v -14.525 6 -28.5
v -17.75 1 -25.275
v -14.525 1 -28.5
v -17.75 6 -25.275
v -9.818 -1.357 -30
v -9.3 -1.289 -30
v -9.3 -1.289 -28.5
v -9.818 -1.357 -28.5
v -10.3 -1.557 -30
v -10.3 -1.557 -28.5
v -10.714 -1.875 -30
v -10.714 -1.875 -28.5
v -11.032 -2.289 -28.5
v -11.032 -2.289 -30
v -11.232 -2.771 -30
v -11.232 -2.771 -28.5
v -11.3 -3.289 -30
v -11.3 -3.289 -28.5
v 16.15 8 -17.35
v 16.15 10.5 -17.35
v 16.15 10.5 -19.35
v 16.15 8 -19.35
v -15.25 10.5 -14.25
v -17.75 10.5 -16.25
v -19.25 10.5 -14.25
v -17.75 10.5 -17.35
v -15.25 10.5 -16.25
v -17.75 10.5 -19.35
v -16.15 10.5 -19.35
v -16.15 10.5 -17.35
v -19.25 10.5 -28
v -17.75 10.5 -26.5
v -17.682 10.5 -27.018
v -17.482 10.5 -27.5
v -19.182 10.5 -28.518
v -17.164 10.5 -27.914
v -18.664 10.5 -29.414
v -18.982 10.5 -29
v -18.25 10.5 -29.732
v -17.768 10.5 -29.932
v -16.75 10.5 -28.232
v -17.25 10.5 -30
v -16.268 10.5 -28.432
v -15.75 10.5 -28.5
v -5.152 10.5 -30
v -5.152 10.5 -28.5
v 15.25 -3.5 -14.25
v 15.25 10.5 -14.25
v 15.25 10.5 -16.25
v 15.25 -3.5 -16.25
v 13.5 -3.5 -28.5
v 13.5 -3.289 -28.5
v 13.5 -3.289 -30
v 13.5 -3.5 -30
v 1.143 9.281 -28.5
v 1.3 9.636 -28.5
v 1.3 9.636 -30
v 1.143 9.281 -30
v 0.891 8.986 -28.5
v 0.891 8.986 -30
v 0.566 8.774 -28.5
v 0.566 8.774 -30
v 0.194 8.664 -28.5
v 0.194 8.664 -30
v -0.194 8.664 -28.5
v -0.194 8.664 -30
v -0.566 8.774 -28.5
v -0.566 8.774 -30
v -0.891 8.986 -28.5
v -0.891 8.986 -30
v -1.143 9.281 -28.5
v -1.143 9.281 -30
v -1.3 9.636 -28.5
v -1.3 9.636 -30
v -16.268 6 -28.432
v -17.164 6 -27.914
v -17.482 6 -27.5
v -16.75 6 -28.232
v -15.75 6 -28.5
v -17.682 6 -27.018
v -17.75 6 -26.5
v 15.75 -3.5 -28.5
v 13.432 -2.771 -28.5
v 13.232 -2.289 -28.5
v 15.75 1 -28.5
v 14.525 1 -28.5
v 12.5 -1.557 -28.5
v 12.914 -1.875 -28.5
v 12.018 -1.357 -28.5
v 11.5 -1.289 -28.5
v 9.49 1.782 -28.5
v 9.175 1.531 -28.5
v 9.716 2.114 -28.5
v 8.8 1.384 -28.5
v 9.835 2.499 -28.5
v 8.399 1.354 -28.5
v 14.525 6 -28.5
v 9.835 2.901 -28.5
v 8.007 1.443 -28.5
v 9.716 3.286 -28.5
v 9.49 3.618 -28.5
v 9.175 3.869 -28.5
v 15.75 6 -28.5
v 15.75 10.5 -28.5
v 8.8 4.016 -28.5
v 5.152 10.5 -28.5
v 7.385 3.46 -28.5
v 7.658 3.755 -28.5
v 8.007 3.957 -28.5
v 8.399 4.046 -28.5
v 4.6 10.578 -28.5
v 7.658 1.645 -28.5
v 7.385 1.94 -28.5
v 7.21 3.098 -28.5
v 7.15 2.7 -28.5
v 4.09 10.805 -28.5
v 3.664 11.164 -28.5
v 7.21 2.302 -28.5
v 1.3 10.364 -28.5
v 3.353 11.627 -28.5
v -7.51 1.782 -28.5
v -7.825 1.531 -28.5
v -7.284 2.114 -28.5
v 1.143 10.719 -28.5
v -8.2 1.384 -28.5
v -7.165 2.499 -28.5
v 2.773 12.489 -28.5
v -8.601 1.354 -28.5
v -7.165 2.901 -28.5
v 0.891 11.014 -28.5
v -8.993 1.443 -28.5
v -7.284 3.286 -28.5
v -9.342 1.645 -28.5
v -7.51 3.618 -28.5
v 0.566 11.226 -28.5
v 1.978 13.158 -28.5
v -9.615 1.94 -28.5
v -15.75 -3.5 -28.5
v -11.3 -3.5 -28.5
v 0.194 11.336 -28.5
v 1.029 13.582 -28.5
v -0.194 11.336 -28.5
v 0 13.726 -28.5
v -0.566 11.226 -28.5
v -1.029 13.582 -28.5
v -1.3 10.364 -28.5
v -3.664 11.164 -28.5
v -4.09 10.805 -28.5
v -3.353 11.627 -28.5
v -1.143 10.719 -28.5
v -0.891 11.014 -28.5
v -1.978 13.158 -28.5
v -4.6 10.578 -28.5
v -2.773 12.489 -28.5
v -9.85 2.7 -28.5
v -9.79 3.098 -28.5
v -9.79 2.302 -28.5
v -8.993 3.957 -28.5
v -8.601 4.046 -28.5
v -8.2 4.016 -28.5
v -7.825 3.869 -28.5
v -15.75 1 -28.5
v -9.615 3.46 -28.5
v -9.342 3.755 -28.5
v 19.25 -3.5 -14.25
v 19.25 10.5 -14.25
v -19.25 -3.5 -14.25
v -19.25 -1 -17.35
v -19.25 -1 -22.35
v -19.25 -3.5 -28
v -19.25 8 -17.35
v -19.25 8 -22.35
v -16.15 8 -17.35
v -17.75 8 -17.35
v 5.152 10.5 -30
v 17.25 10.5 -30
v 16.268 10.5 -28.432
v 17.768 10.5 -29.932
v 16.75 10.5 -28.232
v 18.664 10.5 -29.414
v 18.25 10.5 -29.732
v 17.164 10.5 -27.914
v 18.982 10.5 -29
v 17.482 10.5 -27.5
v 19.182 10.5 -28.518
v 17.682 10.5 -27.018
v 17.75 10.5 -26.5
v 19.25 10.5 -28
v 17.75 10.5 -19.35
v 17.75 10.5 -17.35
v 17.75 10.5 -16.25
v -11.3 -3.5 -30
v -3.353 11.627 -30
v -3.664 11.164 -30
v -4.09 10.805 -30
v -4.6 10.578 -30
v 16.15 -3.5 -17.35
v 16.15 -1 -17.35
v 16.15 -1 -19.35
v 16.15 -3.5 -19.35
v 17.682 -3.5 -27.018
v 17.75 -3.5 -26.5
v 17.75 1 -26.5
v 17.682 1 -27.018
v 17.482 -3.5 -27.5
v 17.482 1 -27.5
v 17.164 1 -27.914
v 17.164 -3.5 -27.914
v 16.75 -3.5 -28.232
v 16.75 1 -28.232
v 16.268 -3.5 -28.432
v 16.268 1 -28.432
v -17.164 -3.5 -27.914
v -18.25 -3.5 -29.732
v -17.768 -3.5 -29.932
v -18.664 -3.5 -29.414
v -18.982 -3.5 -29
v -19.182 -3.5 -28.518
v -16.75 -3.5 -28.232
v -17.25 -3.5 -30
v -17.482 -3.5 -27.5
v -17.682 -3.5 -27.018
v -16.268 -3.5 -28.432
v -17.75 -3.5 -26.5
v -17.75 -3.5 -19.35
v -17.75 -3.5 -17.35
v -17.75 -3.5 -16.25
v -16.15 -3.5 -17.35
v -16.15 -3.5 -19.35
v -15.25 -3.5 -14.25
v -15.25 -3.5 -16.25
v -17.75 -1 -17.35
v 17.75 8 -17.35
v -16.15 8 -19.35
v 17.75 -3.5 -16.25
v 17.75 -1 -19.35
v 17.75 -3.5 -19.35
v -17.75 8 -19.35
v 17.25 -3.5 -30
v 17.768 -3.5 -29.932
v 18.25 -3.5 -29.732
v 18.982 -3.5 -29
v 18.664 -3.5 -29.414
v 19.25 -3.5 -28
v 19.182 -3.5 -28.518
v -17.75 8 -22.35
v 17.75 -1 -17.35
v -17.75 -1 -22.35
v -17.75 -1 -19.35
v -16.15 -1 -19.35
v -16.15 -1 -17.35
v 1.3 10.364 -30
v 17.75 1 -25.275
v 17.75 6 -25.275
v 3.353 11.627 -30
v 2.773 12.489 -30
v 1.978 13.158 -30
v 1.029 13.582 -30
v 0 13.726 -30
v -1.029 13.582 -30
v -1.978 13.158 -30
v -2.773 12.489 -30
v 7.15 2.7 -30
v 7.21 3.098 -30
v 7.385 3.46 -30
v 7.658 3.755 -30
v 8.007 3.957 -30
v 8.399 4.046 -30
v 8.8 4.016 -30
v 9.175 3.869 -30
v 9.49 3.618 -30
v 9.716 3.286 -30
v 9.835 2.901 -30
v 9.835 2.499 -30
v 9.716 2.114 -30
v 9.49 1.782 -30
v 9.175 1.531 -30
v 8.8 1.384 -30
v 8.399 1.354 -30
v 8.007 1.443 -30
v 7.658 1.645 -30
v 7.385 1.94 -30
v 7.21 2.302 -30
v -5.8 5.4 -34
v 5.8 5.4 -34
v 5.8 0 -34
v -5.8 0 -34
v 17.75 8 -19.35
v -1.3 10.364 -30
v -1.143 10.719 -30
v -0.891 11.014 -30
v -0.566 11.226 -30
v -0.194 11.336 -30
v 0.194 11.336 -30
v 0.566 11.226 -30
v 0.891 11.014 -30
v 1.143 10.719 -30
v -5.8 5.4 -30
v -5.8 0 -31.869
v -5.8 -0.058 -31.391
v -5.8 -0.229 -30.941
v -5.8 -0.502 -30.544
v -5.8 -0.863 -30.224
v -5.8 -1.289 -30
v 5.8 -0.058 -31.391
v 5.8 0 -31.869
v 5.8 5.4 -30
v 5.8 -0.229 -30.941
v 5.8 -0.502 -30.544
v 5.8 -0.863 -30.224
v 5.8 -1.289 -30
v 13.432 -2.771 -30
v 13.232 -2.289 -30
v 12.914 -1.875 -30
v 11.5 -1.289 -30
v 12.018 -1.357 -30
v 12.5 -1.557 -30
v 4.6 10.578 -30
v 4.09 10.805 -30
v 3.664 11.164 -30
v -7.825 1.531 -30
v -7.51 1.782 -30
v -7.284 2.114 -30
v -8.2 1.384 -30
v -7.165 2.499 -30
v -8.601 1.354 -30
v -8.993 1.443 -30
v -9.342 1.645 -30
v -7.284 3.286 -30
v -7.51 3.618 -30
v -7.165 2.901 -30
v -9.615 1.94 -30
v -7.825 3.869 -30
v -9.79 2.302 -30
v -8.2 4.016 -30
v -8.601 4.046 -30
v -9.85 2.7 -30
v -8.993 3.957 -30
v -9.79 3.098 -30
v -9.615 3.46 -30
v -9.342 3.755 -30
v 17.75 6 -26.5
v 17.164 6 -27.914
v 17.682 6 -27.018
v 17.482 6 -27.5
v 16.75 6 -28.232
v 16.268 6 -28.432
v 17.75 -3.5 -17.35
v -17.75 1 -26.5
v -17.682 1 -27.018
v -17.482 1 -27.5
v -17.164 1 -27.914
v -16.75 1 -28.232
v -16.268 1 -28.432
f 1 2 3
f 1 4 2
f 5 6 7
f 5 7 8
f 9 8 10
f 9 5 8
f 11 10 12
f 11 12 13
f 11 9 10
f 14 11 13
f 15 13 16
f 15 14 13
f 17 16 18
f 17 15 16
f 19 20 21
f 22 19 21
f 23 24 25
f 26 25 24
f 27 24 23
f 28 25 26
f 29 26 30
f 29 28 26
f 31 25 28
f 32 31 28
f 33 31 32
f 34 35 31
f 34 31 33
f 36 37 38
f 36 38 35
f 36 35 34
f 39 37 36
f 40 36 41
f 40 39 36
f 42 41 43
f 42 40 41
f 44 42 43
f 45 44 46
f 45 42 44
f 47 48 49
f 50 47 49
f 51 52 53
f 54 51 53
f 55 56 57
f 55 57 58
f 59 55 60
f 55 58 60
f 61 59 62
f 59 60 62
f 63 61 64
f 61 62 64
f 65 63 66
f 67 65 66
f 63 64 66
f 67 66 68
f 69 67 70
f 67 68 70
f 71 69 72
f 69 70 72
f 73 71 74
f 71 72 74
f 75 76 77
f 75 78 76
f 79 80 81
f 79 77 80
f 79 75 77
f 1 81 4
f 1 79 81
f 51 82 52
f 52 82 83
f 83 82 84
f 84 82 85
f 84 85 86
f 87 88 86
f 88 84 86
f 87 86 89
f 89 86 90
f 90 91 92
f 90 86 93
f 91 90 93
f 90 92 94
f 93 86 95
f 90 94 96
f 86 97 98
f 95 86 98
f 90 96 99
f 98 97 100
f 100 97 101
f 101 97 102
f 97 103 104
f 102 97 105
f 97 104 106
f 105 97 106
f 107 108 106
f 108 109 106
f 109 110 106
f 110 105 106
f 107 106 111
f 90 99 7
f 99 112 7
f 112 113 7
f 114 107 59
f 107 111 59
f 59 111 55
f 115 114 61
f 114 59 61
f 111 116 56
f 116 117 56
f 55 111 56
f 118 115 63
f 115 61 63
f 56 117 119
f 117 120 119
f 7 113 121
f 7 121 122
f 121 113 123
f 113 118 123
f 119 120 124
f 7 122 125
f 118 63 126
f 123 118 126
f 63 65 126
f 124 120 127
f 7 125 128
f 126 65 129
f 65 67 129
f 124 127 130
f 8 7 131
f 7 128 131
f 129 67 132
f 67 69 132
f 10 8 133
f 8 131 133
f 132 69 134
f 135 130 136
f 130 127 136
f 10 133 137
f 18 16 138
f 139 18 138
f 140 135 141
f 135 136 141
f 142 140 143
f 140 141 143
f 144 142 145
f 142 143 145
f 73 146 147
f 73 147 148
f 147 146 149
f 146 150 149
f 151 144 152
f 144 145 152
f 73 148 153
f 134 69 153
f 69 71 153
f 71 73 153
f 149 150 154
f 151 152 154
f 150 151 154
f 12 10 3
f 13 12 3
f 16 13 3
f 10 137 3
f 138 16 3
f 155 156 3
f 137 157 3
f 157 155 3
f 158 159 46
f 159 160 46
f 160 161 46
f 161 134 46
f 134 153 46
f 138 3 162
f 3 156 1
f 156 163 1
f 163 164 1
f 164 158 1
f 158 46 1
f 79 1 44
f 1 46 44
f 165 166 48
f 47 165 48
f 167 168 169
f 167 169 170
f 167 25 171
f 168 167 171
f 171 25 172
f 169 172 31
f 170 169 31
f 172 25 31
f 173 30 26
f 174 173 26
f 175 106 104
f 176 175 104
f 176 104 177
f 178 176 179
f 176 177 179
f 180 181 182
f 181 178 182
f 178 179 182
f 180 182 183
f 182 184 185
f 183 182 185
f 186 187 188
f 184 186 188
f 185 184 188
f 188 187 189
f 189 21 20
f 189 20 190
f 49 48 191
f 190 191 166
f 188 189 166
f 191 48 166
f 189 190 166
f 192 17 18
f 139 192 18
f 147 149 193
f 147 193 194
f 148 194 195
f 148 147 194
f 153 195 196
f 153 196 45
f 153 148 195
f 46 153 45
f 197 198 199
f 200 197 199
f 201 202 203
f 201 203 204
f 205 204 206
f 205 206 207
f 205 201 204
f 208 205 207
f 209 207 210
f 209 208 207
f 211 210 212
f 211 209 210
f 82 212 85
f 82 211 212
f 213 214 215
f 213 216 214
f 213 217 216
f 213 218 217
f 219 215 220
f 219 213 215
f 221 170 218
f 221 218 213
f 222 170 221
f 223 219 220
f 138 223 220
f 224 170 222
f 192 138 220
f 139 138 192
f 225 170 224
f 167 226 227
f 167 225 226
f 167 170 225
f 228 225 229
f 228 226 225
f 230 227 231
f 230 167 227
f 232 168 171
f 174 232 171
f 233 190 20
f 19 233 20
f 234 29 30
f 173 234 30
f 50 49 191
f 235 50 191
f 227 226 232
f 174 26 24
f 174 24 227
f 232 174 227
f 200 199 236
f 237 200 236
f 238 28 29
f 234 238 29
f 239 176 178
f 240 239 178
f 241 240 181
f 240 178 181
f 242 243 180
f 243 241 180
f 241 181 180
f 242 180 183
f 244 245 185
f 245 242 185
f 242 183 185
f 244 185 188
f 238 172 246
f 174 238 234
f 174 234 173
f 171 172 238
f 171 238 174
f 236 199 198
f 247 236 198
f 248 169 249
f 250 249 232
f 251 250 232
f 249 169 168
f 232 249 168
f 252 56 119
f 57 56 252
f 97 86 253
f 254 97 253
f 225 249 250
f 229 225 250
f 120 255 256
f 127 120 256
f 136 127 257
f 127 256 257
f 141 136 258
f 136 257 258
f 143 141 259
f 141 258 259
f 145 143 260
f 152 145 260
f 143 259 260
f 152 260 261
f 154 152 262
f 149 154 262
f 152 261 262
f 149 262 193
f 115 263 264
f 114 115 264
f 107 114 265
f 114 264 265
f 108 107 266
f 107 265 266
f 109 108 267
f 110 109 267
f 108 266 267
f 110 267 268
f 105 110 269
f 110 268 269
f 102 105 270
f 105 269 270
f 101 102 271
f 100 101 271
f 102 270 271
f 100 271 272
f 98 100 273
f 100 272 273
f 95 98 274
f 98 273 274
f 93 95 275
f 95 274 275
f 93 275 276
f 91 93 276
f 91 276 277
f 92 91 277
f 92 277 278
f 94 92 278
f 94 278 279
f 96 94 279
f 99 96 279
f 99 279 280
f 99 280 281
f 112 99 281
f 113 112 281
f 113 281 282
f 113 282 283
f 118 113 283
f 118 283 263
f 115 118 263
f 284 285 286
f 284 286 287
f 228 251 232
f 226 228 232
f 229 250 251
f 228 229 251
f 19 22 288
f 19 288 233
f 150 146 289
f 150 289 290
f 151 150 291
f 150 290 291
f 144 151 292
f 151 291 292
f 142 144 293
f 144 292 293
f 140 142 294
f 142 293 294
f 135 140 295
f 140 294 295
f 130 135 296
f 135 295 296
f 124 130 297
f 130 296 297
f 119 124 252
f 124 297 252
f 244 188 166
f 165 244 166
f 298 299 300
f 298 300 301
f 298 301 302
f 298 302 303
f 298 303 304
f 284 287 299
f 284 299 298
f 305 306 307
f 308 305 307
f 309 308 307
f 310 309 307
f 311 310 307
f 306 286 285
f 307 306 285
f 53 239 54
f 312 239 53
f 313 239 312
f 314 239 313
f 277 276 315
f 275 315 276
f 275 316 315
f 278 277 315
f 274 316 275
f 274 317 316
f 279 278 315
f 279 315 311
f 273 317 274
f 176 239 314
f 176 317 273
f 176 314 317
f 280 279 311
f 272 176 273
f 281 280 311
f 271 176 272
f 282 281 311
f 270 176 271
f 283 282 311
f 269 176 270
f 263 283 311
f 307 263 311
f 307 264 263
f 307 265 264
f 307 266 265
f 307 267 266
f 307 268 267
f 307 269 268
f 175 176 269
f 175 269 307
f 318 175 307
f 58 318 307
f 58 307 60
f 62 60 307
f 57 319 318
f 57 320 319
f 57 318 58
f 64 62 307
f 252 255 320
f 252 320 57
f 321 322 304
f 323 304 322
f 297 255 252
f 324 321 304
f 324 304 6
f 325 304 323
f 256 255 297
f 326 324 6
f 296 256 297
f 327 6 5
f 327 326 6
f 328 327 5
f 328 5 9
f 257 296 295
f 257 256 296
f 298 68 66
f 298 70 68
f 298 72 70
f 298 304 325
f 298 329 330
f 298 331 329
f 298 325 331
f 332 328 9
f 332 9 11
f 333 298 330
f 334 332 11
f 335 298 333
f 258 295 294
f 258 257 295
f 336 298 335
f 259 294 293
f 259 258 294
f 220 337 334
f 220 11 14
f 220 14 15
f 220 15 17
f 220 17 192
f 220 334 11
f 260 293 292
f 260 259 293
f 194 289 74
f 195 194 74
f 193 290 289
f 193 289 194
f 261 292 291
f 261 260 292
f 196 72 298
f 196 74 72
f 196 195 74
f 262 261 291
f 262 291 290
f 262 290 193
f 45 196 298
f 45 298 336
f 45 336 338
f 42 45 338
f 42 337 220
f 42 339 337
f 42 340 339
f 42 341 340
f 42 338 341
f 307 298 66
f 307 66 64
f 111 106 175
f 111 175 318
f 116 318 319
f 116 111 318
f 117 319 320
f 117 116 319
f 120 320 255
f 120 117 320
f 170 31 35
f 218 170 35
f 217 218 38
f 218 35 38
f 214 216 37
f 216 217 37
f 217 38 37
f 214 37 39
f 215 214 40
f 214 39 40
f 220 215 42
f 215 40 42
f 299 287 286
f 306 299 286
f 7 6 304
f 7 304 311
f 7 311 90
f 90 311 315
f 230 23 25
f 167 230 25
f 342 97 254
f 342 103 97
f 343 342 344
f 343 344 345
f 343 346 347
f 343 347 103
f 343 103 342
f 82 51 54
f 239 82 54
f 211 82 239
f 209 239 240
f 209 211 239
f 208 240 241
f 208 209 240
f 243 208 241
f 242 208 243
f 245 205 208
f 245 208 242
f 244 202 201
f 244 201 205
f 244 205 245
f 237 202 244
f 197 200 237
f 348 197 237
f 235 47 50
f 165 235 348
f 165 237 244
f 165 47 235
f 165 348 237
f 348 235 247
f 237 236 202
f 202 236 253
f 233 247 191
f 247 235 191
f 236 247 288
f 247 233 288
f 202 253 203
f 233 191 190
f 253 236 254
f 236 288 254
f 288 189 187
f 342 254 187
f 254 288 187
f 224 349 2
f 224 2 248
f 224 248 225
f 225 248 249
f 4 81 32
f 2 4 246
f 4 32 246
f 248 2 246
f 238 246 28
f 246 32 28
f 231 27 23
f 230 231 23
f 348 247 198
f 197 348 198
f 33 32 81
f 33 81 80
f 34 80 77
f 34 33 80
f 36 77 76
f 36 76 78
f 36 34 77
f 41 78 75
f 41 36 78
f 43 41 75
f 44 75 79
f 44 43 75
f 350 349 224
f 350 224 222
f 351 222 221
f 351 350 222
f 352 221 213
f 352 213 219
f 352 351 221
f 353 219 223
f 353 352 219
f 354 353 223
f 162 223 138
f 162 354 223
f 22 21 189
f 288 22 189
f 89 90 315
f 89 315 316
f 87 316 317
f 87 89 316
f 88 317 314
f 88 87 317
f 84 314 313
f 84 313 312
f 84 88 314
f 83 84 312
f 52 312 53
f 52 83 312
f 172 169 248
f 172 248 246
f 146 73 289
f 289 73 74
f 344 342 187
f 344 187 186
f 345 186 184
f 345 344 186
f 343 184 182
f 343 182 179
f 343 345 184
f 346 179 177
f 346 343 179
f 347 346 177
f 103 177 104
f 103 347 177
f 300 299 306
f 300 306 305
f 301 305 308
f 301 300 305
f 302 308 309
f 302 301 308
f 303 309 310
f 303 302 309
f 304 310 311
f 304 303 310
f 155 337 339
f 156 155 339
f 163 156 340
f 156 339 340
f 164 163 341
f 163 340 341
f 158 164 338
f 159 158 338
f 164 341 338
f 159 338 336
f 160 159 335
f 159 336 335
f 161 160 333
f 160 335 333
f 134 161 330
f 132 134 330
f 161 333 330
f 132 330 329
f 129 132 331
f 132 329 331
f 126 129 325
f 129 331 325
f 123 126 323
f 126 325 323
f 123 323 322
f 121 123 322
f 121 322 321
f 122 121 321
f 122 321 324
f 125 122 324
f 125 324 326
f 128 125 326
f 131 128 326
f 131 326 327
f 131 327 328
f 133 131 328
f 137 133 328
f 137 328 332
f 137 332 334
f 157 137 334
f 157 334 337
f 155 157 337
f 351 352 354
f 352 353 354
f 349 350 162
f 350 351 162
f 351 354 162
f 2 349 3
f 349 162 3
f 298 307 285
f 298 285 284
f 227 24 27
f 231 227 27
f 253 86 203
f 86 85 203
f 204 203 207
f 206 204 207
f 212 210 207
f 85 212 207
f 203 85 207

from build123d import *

# Parameters (mm, degrees)
SKETCH_1_W               = 27
SKETCH_1_H               = 17
EXTRUDE_1_DEPTH          = 1
SKETCH_2_R               = 2.55
CUT_EXTRUDE_1_DEPTH      = 16.984367363
EXTRUDE_2_DEPTH          = 17
SKETCH_6_W               = 1.5
SKETCH_6_H               = 2
EXTRUDE_3_DEPTH          = 2
CHAMFER_1_SIZE           = 1
CUT_EXTRUDE_4_REACH      = 39.316
SKETCH_8_R               = 2
FILLET_1_R               = 3
SKETCH_9_W               = 7
SKETCH_9_H               = 13
EXTRUDE_4_DEPTH          = 1.5
SKETCH_7_R               = 1.35
CUT_EXTRUDE_5_DEPTH      = 10
CUT_EXTRUDE_6_REACH      = 41.373
FILLET_2_R               = 2.2
SKETCH_13_W              = 11.6
SKETCH_13_H              = 5.4
EXTRUDE_6_DEPTH          = 4
CUT_EXTRUDE_7_DEPTH      = 44.188540186
CUT_EXTRUDE_7_DEPTH_BACK = 44.188540186
SKETCH_14_OUTSIDE_W      = 46.664
SKETCH_14_OUTSIDE_H      = 47.664
SKETCH_14_OUTSIDE_W_2    = 27
SKETCH_14_OUTSIDE_H_2    = 5.5
EXTRUDE_7_DEPTH          = 3.5
EXTRUDE_7_DEPTH_BACK     = 10.5
SKETCH_16_W              = 5.6
SKETCH_16_H              = 1.5
SKETCH_16_W_2            = 4.4
SKETCH_16_W_3            = 12.2
EXTRUDE_8_DEPTH          = 2
EXTRUDE_9_DEPTH          = 2.5
CUT_EXTRUDE_8_REACH      = 54.983
SKETCH_18_W              = 5
SKETCH_18_H              = 9
EXTRUDE_START            = -1.5
SKETCH_19_R              = 3.726433752
SKETCH_19_R_2            = 1.35
SKETCH_19_W              = 24.8
SKETCH_19_H              = 1.288897449
EXTRUDE_10_DEPTH         = 1.5
FILLET_4_R               = 2


# Some blends are built 0.0001 mm under size
with BuildPart() as part:
    # 草图1 → 凸台-拉伸1 (new body)
    with BuildSketch(Plane.XY):
        Rectangle(SKETCH_1_W, SKETCH_1_H)
    extrude(amount=EXTRUDE_1_DEPTH)

    # 草图2 → 切除-拉伸1 (cut, through all)
    with BuildSketch(Plane.XY.offset(1)):
        with Locations((0, 4.125)):
            Circle(SKETCH_2_R)
        with Locations((0, -4.125)):
            Circle(SKETCH_2_R)
        with Locations((8.27, 4.125)):
            Circle(SKETCH_2_R)
        with Locations((8.27, -4.125)):
            Circle(SKETCH_2_R)
        with Locations((-8.27, 4.125)):
            Circle(SKETCH_2_R)
        with Locations((-8.27, -4.125)):
            Circle(SKETCH_2_R)
    extrude(amount=-CUT_EXTRUDE_1_DEPTH, mode=Mode.SUBTRACT)

    # 草图3 → 凸台-拉伸2 (add)
    with BuildSketch(Plane.XZ.offset(8.5)):
        Polygon((13.5, 0), (19, 0), (19, -28.5), (-13.5, -28.5), (-13.5, -30), (20.5, -30), (20.5, 1), (13.5, 1), align=None)
    extrude(amount=-EXTRUDE_2_DEPTH)

    # 草图6 → 凸台-拉伸3 (add, symmetric)
    with BuildSketch(Plane(origin=(0, 0, 0), x_dir=(1, 0, 0), z_dir=(0, 1, 0))):
        Polygon((19, 0), (19, 5), (14, 0), align=None)
        Polygon((19, 28.5), (14, 28.5), (19, 23.5), align=None)
        with Locations((18.25, 20)):
            Rectangle(SKETCH_6_W, SKETCH_6_H)
    extrude(amount=EXTRUDE_3_DEPTH, both=True)

    # 倒角1
    chamfer_1_edges = [part.edges().sort_by_distance(p)[0] for p in [
        (-13.5, 0, 0),
    ]]
    chamfer(chamfer_1_edges, length=CHAMFER_1_SIZE - 0.0001)  # a hair under: the kernel refuses the full size

    # 草图8 → 切除-拉伸4 (cut, up to next)
    with BuildSketch(Plane(origin=(0, 0, 0), x_dir=(-1, 0, 0), z_dir=(0, 0, -1)), mode=Mode.PRIVATE) as cut_extrude_4_sk1:
        Circle(SKETCH_8_R)
    cut_extrude_4_tool1 = extrude(cut_extrude_4_sk1.sketch, amount=-CUT_EXTRUDE_4_REACH, mode=Mode.PRIVATE) & part.part
    add(cut_extrude_4_tool1.solids().sort_by_distance((0, 0, 0))[0], mode=Mode.SUBTRACT)

    # 圆角1
    fillet_1_edges = [part.edges().sort_by_distance(p)[0] for p in [
        (20.5, 0, 1),
        (20.5, 0, -30),
        (19, 5.25, -28.5),
        (19, 5.25, 0),
        (19, -5.25, 0),
        (19, -5.25, -28.5),
    ]]
    fillet(fillet_1_edges, radius=FILLET_1_R)

    # 草图9 → 凸台-拉伸4 (add)
    with BuildSketch(Plane(origin=(0, 0, -30), x_dir=(-1, 0, 0), z_dir=(0, 0, -1))):
        with Locations((0, 6.5)):
            Rectangle(SKETCH_9_W, SKETCH_9_H)
    extrude(amount=-EXTRUDE_4_DEPTH)

    # 草图7 → 切除-拉伸5 (cut)
    with BuildSketch(Plane(origin=(0, 0, -30), x_dir=(-1, 0, 0), z_dir=(0, 0, -1))):
        with Locations((0, 10)):
            Circle(SKETCH_7_R)
        with Locations((-8.5, 2.7)):
            Circle(SKETCH_7_R)
        with Locations((8.5, 2.7)):
            Circle(SKETCH_7_R)
    extrude(amount=-CUT_EXTRUDE_5_DEPTH, mode=Mode.SUBTRACT)

    # 草图11 → 切除-拉伸6 (cut, up to next)
    with BuildSketch(Plane(origin=(0, 0, -30), x_dir=(-1, 0, 0), z_dir=(0, 0, -1)), mode=Mode.PRIVATE) as cut_extrude_6_sk1:
        with BuildLine():
            Line((13.5, -8.5), (13.5, 0))
            Line((13.5, 0), (-9, 0))
            ThreePointArc((-9, 0), (-15.01040764, -2.48959236), (-17.5, -8.5))
            Line((-17.5, -8.5), (13.5, -8.5))
        make_face()
    cut_extrude_6_tool1 = extrude(cut_extrude_6_sk1.sketch, amount=-CUT_EXTRUDE_6_REACH, mode=Mode.PRIVATE) & part.part
    add(cut_extrude_6_tool1.solids().sort_by_distance((1.149624, -4.397011, -30))[0], mode=Mode.SUBTRACT)

    # 圆角2
    fillet_2_edges = [part.edges().sort_by_distance(p)[0] for p in [
        (-3.5, 13, -29.25),
        (-3.5, 8.5, -29.25),
        (3.5, 13, -29.25),
        (3.5, 8.5, -29.25),
        (-13.5, 0, -29.25),
        (-13.5, 8.5, -29.25),
    ]]
    fillet(fillet_2_edges, radius=FILLET_2_R)

    # 草图13 → 凸台-拉伸6 (add)
    with BuildSketch(Plane(origin=(0, 0, -30), x_dir=(-1, 0, 0), z_dir=(0, 0, -1))):
        with Locations((0, 2.7)):
            Rectangle(SKETCH_13_W, SKETCH_13_H)
    extrude(amount=EXTRUDE_6_DEPTH)

    # 草图14 outside → 切除-拉伸7 (cut, two sides: drawn at the far end of the back side and taken through both)
    with BuildSketch(Plane(origin=(0, 8.5, 0), x_dir=(1, 0, 0), z_dir=(0, 1, 0)).offset(-CUT_EXTRUDE_7_DEPTH_BACK)):
        with Locations((3.5, 16.5)):
            Rectangle(SKETCH_14_OUTSIDE_W, SKETCH_14_OUTSIDE_H)
        with Locations((0, 31.25)):
            Rectangle(SKETCH_14_OUTSIDE_W_2, SKETCH_14_OUTSIDE_H_2, mode=Mode.SUBTRACT)
    extrude(amount=CUT_EXTRUDE_7_DEPTH + CUT_EXTRUDE_7_DEPTH_BACK, mode=Mode.SUBTRACT)

    # 草图15 → 凸台-拉伸7 (add, two sides: drawn at the far end of the back side and taken through both)
    with BuildSketch(Plane.XZ.offset(-EXTRUDE_7_DEPTH_BACK)):
        Polygon((-19.25, -14.25), (-19.25, -30), (-11.3, -30), (-11.3, -28.5), (-17.75, -28.5), (-17.75, -19.35), (-16.15, -19.35), (-16.15, -17.35), (-17.75, -17.35), (-17.75, -16.25), (-15.25, -16.25), (-15.25, -14.25), align=None)
        Polygon((17.75, -28.5), (13.5, -28.5), (13.5, -30), (19.25, -30), (19.25, -14.25), (15.25, -14.25), (15.25, -16.25), (17.75, -16.25), (17.75, -17.35), (16.15, -17.35), (16.15, -19.35), (17.75, -19.35), align=None)
    extrude(amount=EXTRUDE_7_DEPTH + EXTRUDE_7_DEPTH_BACK)

    # 草图16 → 凸台-拉伸8 (add)
    with BuildSketch(Plane(origin=(0, 8.5, 0), x_dir=(1, 0, 0), z_dir=(0, 1, 0))):
        with Locations((-8.5, 29.25)):
            Rectangle(SKETCH_16_W, SKETCH_16_H)
        with Locations((-3.5, 29.25)):
            Rectangle(SKETCH_16_W_2, SKETCH_16_H)
        with Locations((7.4, 29.25)):
            Rectangle(SKETCH_16_W_3, SKETCH_16_H)
    extrude(amount=EXTRUDE_8_DEPTH)

    # 草图17 → 凸台-拉伸9 (add, symmetric)
    with BuildSketch(Plane(origin=(0, 3.5, 0), x_dir=(-1, 0, 0), z_dir=(0, -1, 0))):
        Polygon((17.75, 25.275), (14.525, 28.5), (17.75, 28.5), align=None)
        Polygon((-17.75, 25.275), (-17.75, 28.5), (-14.525, 28.5), align=None)
    extrude(amount=EXTRUDE_9_DEPTH, both=True)

    # 切除-拉伸8: up to this face of the body (flat: up to its plane)
    cut_extrude_8_end = Plane(part.part.faces().sort_by_distance((17.75, 3.5, -16.8))[0])
    # 草图18 → 切除-拉伸8 (cut, up to the picked face)
    with BuildSketch(Plane.ZY.offset(19.25), mode=Mode.PRIVATE) as cut_extrude_8_sk1:
        with Locations((-19.85, 3.5)):
            Rectangle(SKETCH_18_W, SKETCH_18_H)
    cut_extrude_8_tool1 = split(extrude(cut_extrude_8_sk1.sketch, amount=-CUT_EXTRUDE_8_REACH, mode=Mode.PRIVATE), bisect_by=cut_extrude_8_end, keep=Keep.BOTH, mode=Mode.PRIVATE)
    add(cut_extrude_8_tool1.solids().sort_by(Axis((-19.25, 3.5, -19.85), (1, 0, 0)))[0], mode=Mode.SUBTRACT)

    # 草图19 → 凸台-拉伸10 (add)
    # profile 1 of 2: a face of its own
    with BuildSketch(Plane.XY.offset(-28.5).offset(EXTRUDE_START)):
        with Locations((0, 10)):
            Circle(SKETCH_19_R)
        with Locations((0, 10)):
            Circle(SKETCH_19_R_2, mode=Mode.SUBTRACT)
    # profile 2 of 2: a face of its own
    with BuildSketch(Plane.XY.offset(-28.5).offset(EXTRUDE_START)):
        with Locations((1.1, -0.644448725)):
            Rectangle(SKETCH_19_W, SKETCH_19_H)
    extrude(amount=EXTRUDE_10_DEPTH)

    # 圆角4
    # the kernel refuses this fillet: 2 mm, written as the material it adds along each edge
    with BuildSketch(Plane(origin=(13.5, -1.288897449, -28.5), x_dir=(0, -1, 0), z_dir=(0, 0, -1))) as fillet_4_piece_1:
        with BuildLine():
            CenterArc((FILLET_4_R, FILLET_4_R), FILLET_4_R, 180, 90)
            Line((0, FILLET_4_R), (0, 0))
            Line((0, 0), (FILLET_4_R, 0))
        make_face()
    extrude(amount=1.5)
    with BuildSketch(Plane(origin=(17.75, 1, -28.5), x_dir=(-1, 0, 0), z_dir=(0, 1, 0)), Plane(origin=(-17.75, 6, -28.5), x_dir=(1, 0, 0), z_dir=(0, -1, 0)), Plane(origin=(-17.75, 10.5, -28.5), x_dir=(1, 0, 0), z_dir=(0, -1, 0)), Plane(origin=(17.75, -3.5, -28.5), x_dir=(-1, 0, 0), z_dir=(0, 1, 0))) as fillet_4_piece_2:
        with BuildLine():
            CenterArc((FILLET_4_R, FILLET_4_R), FILLET_4_R, 180, 90)
            Line((0, FILLET_4_R), (0, 0))
            Line((0, 0), (FILLET_4_R, 0))
        make_face()
    extrude(amount=9.5)
    with BuildSketch(Plane(origin=(-3.692737265, 10.5, -28.5), x_dir=(-1, 0, 0), z_dir=(0, 0, -1))) as fillet_4_piece_3:
        with BuildLine():
            CenterArc((1.459159814, 2), FILLET_4_R, 205.88535786, 64.11464214)
            ThreePointArc((-0.340178937, 1.126856222), (-0.125315404, 0.576944648), (0, 0))
            Line((0, 0), (1.459159814, 0))
        make_face()
    extrude(amount=1.5)
    with BuildSketch(Plane(origin=(3.692737265, 10.5, -28.5), x_dir=(-0.28900142054358374, 0.9573286681823493, 0), z_dir=(0, 0, -1))) as fillet_4_piece_4:
        with BuildLine():
            CenterArc((1.492958077, 1.974898363), FILLET_4_R, 196.798181975, 64.11464214)
            Line((-0.421699259, 1.396895522), (0, 0))
            ThreePointArc((0, 0), (0.588541981, 0.046769794), (1.177083962, 0))
        make_face()
    extrude(amount=1.5)
    with BuildSketch(Plane(origin=(-5.8, 0, -30), x_dir=(0, -1, 0), z_dir=(1, 0, 0))) as fillet_4_piece_5:
        with BuildLine():
            CenterArc((2, 1.869313554), FILLET_4_R, 180, 69.172765444)
            Line((0, 1.869313554), (0, 0))
            Line((0, 0), (1.288897449, 0))
        make_face()
    extrude(amount=11.6)
    with BuildSketch(Plane(origin=(-11.3, -1.288897449, -30), x_dir=(1, 0, 0), z_dir=(0, 0, 1))) as fillet_4_piece_6:
        with BuildLine():
            CenterArc((FILLET_4_R, -FILLET_4_R), FILLET_4_R, 90, 90)
            Line((0, -FILLET_4_R), (0, 0))
            Line((0, 0), (FILLET_4_R, 0))
        make_face()
    extrude(amount=1.5)
    # the kernel refuses this fillet: 2 mm, written as the material it takes off along each edge
    with BuildSketch(Plane(origin=(19.25, 15.5, -30), x_dir=(-1, 0, 0), z_dir=(0, -1, 0))) as fillet_4_2_piece_1:
        with BuildLine():
            CenterArc((FILLET_4_R, -FILLET_4_R), FILLET_4_R, 90, 90)
            Line((0, -FILLET_4_R), (0, 0))
            Line((0, 0), (FILLET_4_R, 0))
        make_face()
    extrude(amount=24, mode=Mode.SUBTRACT)
    with BuildSketch(Plane(origin=(-19.25, 15.5, -30), x_dir=(1, 0, 0), z_dir=(0, -1, 0))) as fillet_4_2_piece_2:
        with BuildLine():
            CenterArc((FILLET_4_R, FILLET_4_R), FILLET_4_R, 180, 90)
            Line((0, FILLET_4_R), (0, 0))
            Line((0, 0), (FILLET_4_R, 0))
        make_face()
    extrude(amount=24, mode=Mode.SUBTRACT)


solid = part.part
